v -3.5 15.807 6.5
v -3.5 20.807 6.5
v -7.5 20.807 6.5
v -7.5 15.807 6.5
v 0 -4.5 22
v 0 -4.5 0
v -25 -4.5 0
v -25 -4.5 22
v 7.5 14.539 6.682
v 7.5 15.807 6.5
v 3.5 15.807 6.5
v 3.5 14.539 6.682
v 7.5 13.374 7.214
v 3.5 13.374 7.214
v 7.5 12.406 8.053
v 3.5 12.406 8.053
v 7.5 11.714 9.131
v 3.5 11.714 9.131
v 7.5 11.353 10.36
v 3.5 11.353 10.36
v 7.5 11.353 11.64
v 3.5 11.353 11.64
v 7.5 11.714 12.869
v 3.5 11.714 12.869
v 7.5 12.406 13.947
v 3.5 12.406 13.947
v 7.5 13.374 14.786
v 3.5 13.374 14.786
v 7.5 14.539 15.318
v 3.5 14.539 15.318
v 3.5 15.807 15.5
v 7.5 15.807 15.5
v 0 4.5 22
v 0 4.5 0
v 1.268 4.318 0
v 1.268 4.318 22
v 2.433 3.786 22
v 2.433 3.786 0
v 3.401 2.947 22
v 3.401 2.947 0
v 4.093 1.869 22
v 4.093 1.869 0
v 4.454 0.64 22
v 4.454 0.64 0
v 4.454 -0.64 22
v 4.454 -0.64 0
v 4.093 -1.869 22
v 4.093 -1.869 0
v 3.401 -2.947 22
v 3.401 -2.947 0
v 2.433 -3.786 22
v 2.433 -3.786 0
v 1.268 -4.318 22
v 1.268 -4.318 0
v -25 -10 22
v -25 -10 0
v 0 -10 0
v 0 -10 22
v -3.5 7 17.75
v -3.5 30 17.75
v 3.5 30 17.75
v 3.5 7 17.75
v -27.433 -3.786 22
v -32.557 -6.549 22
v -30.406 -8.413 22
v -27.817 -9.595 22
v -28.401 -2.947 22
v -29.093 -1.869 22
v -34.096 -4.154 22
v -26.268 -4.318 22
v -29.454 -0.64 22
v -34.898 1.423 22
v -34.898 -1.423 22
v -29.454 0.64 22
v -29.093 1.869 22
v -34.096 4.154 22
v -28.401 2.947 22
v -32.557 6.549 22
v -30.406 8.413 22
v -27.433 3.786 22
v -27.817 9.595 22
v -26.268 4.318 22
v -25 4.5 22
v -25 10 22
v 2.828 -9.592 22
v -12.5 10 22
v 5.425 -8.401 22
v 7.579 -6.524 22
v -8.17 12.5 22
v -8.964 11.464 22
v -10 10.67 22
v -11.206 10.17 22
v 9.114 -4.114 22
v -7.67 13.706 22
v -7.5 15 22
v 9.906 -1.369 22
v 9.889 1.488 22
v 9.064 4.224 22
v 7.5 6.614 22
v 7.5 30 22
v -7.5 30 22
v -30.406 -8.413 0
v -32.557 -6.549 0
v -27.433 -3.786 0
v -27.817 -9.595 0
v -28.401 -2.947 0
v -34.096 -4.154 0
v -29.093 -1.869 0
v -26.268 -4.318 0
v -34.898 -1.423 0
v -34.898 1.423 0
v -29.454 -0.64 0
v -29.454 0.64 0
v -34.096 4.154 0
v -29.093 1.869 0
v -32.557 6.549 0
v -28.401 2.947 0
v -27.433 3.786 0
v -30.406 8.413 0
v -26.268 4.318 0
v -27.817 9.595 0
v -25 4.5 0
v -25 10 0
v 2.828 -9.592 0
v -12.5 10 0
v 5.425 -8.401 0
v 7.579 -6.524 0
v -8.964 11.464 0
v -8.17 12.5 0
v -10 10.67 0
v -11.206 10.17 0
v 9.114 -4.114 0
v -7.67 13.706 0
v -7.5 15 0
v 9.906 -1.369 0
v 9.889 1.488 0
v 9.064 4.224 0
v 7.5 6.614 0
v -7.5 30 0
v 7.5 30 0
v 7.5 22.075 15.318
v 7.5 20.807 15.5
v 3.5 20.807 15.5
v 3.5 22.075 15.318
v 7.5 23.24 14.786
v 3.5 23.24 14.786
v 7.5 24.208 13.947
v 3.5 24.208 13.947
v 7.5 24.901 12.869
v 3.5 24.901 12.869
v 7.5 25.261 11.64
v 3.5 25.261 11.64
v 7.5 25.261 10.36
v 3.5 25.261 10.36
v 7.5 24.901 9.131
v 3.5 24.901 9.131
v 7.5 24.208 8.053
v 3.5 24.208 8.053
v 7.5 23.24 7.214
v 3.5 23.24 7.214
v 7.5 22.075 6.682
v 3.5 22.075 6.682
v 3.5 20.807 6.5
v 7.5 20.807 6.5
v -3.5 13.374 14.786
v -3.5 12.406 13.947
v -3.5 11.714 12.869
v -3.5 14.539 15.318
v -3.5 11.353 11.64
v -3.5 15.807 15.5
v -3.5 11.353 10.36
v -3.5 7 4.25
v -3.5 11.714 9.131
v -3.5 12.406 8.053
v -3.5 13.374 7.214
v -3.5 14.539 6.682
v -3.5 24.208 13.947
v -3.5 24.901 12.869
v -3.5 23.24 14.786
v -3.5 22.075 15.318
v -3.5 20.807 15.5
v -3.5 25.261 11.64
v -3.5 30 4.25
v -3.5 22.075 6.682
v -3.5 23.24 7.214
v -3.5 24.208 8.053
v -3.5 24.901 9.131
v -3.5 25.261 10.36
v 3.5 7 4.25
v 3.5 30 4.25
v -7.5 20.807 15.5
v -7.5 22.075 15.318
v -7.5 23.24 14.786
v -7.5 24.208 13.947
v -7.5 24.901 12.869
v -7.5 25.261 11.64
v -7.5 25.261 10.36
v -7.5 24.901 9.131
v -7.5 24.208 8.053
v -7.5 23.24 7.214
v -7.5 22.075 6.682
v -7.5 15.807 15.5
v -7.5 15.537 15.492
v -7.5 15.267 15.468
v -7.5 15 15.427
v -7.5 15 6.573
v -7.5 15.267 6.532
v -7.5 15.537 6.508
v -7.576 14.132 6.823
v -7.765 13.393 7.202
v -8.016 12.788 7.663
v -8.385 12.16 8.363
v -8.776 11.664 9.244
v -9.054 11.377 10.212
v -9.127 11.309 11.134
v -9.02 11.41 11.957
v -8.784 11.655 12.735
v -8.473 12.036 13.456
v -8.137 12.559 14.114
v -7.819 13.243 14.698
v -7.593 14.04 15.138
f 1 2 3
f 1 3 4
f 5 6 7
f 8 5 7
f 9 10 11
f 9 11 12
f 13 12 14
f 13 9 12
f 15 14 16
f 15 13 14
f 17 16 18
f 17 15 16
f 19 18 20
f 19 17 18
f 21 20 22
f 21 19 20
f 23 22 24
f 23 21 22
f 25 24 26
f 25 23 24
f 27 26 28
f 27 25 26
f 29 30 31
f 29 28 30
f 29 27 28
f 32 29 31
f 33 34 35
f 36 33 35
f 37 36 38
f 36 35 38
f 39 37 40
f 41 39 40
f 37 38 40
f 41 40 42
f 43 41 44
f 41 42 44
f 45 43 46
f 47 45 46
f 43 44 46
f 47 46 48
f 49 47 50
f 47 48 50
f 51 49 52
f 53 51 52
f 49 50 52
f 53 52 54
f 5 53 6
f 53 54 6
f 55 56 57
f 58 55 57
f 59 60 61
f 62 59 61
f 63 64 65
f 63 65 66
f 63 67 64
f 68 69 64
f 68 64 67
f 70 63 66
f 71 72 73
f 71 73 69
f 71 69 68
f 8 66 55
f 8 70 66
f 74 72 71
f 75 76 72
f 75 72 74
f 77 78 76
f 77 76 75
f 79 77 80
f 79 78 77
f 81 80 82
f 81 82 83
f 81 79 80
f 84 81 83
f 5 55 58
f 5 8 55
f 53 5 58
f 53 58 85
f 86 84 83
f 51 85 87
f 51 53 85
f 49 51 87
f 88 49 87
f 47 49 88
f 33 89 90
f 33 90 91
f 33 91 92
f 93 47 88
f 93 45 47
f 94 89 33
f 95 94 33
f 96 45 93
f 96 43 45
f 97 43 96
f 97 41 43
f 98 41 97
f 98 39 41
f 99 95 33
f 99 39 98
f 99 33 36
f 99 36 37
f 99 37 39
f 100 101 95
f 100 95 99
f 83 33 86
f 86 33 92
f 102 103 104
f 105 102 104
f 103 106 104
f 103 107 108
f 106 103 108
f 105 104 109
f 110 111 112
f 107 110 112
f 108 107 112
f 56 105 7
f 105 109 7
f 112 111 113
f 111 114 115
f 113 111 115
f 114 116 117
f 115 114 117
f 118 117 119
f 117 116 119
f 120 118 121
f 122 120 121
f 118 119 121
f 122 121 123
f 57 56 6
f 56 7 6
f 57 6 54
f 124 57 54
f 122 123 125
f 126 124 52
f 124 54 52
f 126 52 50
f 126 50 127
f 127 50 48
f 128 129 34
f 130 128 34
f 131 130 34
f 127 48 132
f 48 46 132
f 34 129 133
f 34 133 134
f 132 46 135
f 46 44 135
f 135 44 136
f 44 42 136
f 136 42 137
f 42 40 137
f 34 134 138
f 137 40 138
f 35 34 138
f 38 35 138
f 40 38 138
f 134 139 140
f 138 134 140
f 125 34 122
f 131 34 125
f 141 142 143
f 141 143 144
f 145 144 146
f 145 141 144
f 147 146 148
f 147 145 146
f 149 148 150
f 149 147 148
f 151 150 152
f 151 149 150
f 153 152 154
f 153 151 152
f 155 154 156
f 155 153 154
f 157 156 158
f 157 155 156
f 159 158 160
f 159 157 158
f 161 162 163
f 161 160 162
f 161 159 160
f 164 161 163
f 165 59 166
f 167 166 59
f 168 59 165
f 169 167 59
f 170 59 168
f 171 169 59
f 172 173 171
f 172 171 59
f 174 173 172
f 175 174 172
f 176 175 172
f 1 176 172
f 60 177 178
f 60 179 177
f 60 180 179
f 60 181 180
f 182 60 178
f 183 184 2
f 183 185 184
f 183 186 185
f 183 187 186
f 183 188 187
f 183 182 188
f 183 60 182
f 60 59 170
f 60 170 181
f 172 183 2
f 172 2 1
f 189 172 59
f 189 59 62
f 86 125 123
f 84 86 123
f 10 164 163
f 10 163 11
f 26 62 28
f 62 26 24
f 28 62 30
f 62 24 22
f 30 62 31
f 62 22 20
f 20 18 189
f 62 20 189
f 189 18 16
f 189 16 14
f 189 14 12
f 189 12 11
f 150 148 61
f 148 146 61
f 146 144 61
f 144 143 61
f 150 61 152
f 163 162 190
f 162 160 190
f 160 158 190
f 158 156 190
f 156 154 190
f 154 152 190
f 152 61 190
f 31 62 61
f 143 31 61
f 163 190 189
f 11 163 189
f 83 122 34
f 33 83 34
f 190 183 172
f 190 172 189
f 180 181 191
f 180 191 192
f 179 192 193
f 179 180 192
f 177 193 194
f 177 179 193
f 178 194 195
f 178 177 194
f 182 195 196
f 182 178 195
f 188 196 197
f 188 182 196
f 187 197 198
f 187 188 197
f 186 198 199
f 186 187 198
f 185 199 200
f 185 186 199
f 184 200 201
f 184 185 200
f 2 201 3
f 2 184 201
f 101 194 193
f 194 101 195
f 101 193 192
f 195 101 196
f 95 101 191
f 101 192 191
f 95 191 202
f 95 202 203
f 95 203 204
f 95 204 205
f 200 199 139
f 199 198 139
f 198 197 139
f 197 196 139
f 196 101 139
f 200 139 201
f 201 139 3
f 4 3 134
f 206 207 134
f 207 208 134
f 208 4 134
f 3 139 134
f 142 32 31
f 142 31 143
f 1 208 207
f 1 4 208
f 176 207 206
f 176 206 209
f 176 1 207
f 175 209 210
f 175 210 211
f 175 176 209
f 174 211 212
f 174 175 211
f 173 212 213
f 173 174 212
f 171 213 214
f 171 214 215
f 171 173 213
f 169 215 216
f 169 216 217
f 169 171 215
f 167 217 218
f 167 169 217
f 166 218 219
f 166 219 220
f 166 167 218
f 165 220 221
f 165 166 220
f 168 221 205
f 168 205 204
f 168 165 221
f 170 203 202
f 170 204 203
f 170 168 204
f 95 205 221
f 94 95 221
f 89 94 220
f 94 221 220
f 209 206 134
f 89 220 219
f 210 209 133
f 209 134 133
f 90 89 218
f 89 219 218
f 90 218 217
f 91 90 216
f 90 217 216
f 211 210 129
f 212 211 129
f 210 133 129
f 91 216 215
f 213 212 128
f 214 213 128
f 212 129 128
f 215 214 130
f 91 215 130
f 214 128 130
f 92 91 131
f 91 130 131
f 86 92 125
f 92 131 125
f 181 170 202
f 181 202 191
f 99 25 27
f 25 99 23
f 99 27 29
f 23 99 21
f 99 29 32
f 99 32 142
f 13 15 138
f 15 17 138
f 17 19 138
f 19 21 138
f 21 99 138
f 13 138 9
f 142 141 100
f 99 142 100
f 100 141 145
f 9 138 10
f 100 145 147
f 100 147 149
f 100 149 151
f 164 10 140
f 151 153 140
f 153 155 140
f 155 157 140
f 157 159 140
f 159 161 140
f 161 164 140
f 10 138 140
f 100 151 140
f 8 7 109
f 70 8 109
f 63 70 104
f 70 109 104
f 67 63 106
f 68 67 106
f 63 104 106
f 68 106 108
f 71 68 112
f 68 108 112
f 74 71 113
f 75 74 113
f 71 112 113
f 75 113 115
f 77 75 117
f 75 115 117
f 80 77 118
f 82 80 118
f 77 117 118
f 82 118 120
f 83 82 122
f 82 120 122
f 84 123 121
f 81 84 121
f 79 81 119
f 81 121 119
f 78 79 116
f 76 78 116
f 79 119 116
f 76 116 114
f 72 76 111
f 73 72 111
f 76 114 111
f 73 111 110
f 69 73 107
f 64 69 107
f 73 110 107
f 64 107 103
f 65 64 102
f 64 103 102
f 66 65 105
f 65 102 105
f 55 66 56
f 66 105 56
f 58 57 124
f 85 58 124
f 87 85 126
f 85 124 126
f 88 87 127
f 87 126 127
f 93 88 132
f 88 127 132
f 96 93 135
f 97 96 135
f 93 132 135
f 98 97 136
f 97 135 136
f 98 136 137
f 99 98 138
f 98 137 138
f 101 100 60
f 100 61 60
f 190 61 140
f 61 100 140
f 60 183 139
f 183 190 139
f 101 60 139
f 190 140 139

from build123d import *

# Parameters (mm, degrees)
RESSALTO_EXTRUS_O1_DEPTH   = 22
ESBO_O2_W                  = 7
ESBO_O2_H                  = 13.5
CORTE_EXTRUS_O1_DEPTH      = 23
CORTE_EXTRUS_O2_DEPTH      = 10
CORTE_EXTRUS_O2_DEPTH_BACK = 35


with BuildPart() as part:
    # Esboço1 → Ressalto-extrusão1 (new body)
    with BuildSketch(Plane.XY):
        with BuildLine():
            Line((7.5, 6.614378278), (7.5, 30))
            Line((7.5, 30), (-7.5, 30))
            Line((-7.5, 30), (-7.5, 15))
            ThreePointArc((-7.5, 15), (-8.964466094, 11.464466094), (-12.5, 10))
            Line((-12.5, 10), (-25, 10))
            ThreePointArc((-25, 10), (-35, 0), (-25, -10))
            Line((-25, -10), (0, -10))
            ThreePointArc((0, -10), (9.114378278, -4.114378278), (7.5, 6.614378278))
        make_face()
        with BuildLine():
            Line((-25, 4.5), (0, 4.5))
            ThreePointArc((0, 4.5), (4.5, 0), (0, -4.5))
            Line((0, -4.5), (-25, -4.5))
            ThreePointArc((-25, -4.5), (-29.5, 0), (-25, 4.5))
        make_face(mode=Mode.SUBTRACT)
    extrude(amount=RESSALTO_EXTRUS_O1_DEPTH)

    # Esboço2 → Corte-extrusão1 (cut)
    with BuildSketch(Plane(origin=(0, 30, 0), x_dir=(1, 0, 0), z_dir=(0, 1, 0))):
        with Locations((0, -11)):
            Rectangle(ESBO_O2_W, ESBO_O2_H)
    extrude(amount=-CORTE_EXTRUS_O1_DEPTH, mode=Mode.SUBTRACT)

    # Esboço3 → Corte-extrusão2 (cut, two sides)
    with BuildSketch(Plane(origin=(7.5, 0, 0), x_dir=(0, 0, -1), z_dir=(1, 0, 0))) as corte_extrus_o2_sk:
        with BuildLine():
            Line((-15.5, 15.807189139), (-15.5, 20.807189139))
            ThreePointArc((-15.5, 20.807189139), (-11, 25.307189139), (-6.5, 20.807189139))
            Line((-6.5, 20.807189139), (-6.5, 15.807189139))
            ThreePointArc((-6.5, 15.807189139), (-11, 11.307189139), (-15.5, 15.807189139))
        make_face()
    extrude(amount=CORTE_EXTRUS_O2_DEPTH, mode=Mode.SUBTRACT)
    extrude(corte_extrus_o2_sk.sketch, amount=-CORTE_EXTRUS_O2_DEPTH_BACK, mode=Mode.SUBTRACT)


solid = part.part
